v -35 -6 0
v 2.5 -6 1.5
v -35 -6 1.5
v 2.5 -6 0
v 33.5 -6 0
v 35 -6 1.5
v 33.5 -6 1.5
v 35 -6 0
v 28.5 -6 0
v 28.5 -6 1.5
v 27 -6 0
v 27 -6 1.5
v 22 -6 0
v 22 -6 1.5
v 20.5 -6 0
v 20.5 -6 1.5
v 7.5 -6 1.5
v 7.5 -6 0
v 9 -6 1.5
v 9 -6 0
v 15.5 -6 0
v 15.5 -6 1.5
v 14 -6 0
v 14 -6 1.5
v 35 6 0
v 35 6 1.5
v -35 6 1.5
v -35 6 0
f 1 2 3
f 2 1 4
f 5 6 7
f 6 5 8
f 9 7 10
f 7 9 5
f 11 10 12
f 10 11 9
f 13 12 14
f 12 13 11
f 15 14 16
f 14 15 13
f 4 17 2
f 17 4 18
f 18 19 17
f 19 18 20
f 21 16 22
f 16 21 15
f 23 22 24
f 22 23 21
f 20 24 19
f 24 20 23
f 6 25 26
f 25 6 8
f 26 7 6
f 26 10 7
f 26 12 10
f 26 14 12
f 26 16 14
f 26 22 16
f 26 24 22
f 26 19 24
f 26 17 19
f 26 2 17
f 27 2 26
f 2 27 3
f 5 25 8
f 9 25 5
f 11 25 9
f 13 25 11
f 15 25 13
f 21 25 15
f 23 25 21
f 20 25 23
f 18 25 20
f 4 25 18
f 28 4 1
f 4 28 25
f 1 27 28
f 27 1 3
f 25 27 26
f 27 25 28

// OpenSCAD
// Agarose gel comb - a flat plate with a spine and a row of rectangular teeth for casting
// horizontal gels. NOVEL general part (a generic comb, not for any one lab).
//

plate_z = 1.5;
spine_l = 70;
spine_w = 12;
teeth_n = 10;
tooth_w = 5.0;
tooth_d = 12;
gap    = 1.5;

$fn = 48;

teeth_x_pitch = tooth_w + gap;
rightmost_x   = spine_l - tooth_w / 2;
row_length    = teeth_n * teeth_x_pitch;
start_x       = (spine_l - row_length) / 2;

difference() {
    translate([-spine_l / 2, -spine_w / 2, 0]) cube([spine_l, spine_w, plate_z]);
    for (i = [0 : teeth_n - 1])
        translate([start_x + i * teeth_x_pitch, -spine_w / 2 - tooth_d, 0])
            cube([tooth_w, tooth_d, plate_z]);
}
